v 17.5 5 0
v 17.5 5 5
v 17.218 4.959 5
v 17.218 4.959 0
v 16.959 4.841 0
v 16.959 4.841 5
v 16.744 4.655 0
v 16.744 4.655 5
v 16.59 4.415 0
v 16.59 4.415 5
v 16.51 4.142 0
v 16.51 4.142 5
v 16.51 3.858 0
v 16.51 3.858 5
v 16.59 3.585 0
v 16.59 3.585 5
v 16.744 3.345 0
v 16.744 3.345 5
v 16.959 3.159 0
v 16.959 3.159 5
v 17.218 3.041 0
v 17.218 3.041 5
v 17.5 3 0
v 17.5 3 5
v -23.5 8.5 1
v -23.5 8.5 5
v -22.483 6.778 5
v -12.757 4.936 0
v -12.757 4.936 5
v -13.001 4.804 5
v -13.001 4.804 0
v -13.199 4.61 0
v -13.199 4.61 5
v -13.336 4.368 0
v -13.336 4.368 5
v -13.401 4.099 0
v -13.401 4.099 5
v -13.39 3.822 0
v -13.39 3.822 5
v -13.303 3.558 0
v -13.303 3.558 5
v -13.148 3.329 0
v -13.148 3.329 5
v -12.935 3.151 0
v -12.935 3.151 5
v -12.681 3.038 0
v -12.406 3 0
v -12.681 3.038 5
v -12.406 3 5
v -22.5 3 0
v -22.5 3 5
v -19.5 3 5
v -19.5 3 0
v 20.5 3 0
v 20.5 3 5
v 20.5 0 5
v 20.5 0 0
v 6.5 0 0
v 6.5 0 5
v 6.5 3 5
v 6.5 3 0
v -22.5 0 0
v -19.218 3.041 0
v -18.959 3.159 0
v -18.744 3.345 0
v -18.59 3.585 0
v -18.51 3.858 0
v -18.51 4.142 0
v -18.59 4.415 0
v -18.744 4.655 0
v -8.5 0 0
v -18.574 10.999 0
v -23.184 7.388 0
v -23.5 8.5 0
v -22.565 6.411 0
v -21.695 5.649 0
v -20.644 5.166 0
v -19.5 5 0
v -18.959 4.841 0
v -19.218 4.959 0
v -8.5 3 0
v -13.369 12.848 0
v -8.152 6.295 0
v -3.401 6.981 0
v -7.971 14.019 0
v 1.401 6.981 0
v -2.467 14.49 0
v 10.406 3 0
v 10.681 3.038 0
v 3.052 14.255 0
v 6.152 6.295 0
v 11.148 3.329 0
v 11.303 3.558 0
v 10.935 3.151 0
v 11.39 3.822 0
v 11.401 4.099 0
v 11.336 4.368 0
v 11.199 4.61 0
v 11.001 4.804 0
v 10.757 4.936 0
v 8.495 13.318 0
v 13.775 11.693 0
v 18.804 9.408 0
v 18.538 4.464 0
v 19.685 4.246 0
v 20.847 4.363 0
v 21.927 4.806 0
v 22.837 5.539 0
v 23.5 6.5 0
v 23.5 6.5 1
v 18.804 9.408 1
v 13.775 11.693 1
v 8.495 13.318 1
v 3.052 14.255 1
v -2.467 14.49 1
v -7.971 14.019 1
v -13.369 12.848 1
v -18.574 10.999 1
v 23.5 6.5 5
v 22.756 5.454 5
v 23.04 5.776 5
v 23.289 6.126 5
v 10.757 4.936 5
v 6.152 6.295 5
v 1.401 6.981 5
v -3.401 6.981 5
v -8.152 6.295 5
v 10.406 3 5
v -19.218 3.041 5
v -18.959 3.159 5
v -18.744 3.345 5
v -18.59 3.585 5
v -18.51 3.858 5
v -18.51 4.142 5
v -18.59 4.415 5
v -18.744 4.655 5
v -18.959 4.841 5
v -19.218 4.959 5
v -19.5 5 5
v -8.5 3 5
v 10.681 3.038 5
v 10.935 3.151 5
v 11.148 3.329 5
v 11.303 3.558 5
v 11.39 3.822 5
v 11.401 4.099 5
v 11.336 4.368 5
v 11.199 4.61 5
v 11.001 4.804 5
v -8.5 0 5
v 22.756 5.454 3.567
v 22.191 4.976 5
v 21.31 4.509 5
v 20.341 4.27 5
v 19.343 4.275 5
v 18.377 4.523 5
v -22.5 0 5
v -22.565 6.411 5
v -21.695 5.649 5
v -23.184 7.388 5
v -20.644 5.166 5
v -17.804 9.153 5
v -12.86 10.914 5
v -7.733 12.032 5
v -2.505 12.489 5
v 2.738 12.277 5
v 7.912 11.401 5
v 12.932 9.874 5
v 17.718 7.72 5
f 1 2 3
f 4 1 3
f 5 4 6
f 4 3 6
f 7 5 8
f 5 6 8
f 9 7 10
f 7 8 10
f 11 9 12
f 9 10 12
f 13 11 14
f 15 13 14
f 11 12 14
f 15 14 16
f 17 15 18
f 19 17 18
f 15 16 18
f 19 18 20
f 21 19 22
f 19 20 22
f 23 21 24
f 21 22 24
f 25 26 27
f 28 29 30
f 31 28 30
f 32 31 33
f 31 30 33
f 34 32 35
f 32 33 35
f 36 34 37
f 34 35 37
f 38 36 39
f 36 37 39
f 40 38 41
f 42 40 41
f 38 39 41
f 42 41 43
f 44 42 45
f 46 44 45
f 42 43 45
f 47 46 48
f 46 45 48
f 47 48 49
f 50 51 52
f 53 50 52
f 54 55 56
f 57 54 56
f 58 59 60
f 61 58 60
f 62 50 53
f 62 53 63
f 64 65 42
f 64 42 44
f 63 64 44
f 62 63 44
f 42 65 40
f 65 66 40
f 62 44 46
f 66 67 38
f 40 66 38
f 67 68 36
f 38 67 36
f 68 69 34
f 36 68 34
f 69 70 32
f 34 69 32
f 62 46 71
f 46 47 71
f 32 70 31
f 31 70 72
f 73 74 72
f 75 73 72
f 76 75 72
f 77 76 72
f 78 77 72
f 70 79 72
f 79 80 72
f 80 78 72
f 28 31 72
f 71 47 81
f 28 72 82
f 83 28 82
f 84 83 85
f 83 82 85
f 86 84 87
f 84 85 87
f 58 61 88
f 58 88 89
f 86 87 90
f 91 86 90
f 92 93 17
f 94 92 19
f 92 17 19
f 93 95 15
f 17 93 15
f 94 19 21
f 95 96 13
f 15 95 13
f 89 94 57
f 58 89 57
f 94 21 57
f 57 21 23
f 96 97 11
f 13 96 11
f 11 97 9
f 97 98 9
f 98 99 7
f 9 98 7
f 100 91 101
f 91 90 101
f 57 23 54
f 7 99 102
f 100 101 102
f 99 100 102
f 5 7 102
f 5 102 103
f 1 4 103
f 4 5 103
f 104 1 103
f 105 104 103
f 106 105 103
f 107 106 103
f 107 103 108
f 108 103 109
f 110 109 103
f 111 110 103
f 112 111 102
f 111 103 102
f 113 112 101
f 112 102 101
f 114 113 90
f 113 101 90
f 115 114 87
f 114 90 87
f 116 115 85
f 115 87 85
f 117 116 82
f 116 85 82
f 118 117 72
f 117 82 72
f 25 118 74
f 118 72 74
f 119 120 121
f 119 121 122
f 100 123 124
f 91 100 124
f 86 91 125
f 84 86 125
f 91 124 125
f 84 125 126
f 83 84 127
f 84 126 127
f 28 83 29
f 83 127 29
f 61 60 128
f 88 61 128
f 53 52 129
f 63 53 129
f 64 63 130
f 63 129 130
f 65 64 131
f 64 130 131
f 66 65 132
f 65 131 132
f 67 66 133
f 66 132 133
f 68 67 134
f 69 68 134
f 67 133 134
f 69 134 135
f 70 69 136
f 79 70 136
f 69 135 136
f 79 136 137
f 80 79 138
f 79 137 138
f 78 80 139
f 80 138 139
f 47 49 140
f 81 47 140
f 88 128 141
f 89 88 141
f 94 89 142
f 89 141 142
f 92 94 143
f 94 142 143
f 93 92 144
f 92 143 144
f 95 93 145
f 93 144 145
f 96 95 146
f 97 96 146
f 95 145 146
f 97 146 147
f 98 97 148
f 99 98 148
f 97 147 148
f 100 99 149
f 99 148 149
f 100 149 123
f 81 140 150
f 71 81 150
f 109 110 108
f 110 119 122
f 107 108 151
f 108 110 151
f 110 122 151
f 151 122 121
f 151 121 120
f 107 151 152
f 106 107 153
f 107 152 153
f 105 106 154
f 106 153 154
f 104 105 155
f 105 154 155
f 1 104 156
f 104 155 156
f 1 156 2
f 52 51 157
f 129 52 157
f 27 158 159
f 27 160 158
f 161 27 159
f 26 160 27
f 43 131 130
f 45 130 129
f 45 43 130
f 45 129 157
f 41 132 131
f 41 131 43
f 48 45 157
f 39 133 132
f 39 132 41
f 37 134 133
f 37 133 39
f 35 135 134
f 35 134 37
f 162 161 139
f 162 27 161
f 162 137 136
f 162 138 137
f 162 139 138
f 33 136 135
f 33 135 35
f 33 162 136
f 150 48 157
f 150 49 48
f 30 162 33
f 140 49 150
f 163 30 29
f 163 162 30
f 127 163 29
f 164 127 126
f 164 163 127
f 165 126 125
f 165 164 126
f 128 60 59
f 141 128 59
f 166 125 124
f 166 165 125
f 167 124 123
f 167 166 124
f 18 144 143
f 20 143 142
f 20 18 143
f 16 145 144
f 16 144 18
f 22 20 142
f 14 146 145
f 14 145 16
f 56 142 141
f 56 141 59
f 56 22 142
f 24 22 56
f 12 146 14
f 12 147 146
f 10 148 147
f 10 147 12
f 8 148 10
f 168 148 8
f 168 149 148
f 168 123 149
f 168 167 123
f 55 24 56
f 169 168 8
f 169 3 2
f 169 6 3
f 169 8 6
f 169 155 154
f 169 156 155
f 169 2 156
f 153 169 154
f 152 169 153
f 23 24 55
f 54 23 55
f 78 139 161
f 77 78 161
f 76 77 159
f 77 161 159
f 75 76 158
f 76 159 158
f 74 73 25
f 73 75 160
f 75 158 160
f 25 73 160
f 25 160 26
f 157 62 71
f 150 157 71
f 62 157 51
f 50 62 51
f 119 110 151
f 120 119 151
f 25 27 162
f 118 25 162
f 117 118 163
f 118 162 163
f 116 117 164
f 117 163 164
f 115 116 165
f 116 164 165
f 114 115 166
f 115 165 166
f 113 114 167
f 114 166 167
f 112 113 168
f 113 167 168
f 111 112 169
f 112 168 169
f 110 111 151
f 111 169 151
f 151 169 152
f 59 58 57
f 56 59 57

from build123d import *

# Parameters (mm, degrees)
F1_DEPTH = 5
F3_DEPTH = 25


with BuildPart() as f1:
    # F0 (on Top) → F1 (new body)
    with BuildSketch(Plane.XY):
        with BuildLine():
            Line((-23.5, 8.5), (-23.5, 0))
            Line((-23.5, 0), (23.5, 0))
            Line((23.5, 0), (23.5, 6.5))
            ThreePointArc((23.5, 6.5), (0.2962107176, 14.4609518625), (-23.5, 8.5))
        make_face()
    extrude(amount=F1_DEPTH)

    # F2 (on face) → F3 (cut)
    with BuildSketch(Plane.XY.offset(5)):
        with BuildLine():
            Line((-23.5, 0), (-22.5, 0))
            Line((-22.5, 0), (-22.5, 3))
            Line((-22.5, 3), (-19.5, 3))
            ThreePointArc((-19.5, 3), (-18.5, 4), (-19.5, 5))
            ThreePointArc((-19.5, 5), (-22.1575364532, 5.9985297678), (-23.5, 8.5))
            Line((-23.5, 8.5), (-23.5, 0))
        make_face()
        with BuildLine():
            Line((-8.5, 3), (-8.5, 0))
            Line((-8.5, 0), (6.5, 0))
            Line((6.5, 0), (6.5, 3))
            Line((6.5, 3), (10.4063445255, 3))
            ThreePointArc((10.4063445255, 3), (11.390316995, 3.8216795603), (10.7572693324, 4.9364036415))
            ThreePointArc((10.7572693324, 4.9364036415), (-1, 7.0671151221), (-12.7572693324, 4.9364036415))
            ThreePointArc((-12.7572693324, 4.9364036415), (-13.390316995, 3.8216795603), (-12.4063445255, 3))
            Line((-12.4063445255, 3), (-8.5, 3))
        make_face()
        with BuildLine():
            Line((23.5, 0), (23.5, 6.5))
            ThreePointArc((23.5, 6.5), (20.8467428507, 4.363028597), (17.5, 5))
            ThreePointArc((17.5, 5), (16.5, 4), (17.5, 3))
            Line((17.5, 3), (20.5, 3))
            Line((20.5, 3), (20.5, 0))
            Line((20.5, 0), (23.5, 0))
        make_face()
    extrude(amount=-F3_DEPTH, mode=Mode.SUBTRACT)

    # F6: sweep along a path in F6_path
    with BuildLine(Plane(origin=(-23.5, 8.5, 0), x_dir=(0, 1, 0), z_dir=(0, 0, 1))) as f6_path:
        ThreePointArc((0, 0), (5.9609518625, -23.7962107176), (-2, -47))
    # F5 (on face) → F6 (sweep, cut)
    with BuildSketch(Plane(origin=(-13.7022180635, -8.0915495232, 0), x_dir=(0.5084863558, -0.8610700471, 0), z_dir=(-0.8610700471, -0.5084863558, 0))):
        Polygon((-19.2685247607, 5), (-19.2685247607, 1), (-17.2685247607, 5), align=None)
    sweep(path=f6_path.line, mode=Mode.SUBTRACT)


solid = f1.part
